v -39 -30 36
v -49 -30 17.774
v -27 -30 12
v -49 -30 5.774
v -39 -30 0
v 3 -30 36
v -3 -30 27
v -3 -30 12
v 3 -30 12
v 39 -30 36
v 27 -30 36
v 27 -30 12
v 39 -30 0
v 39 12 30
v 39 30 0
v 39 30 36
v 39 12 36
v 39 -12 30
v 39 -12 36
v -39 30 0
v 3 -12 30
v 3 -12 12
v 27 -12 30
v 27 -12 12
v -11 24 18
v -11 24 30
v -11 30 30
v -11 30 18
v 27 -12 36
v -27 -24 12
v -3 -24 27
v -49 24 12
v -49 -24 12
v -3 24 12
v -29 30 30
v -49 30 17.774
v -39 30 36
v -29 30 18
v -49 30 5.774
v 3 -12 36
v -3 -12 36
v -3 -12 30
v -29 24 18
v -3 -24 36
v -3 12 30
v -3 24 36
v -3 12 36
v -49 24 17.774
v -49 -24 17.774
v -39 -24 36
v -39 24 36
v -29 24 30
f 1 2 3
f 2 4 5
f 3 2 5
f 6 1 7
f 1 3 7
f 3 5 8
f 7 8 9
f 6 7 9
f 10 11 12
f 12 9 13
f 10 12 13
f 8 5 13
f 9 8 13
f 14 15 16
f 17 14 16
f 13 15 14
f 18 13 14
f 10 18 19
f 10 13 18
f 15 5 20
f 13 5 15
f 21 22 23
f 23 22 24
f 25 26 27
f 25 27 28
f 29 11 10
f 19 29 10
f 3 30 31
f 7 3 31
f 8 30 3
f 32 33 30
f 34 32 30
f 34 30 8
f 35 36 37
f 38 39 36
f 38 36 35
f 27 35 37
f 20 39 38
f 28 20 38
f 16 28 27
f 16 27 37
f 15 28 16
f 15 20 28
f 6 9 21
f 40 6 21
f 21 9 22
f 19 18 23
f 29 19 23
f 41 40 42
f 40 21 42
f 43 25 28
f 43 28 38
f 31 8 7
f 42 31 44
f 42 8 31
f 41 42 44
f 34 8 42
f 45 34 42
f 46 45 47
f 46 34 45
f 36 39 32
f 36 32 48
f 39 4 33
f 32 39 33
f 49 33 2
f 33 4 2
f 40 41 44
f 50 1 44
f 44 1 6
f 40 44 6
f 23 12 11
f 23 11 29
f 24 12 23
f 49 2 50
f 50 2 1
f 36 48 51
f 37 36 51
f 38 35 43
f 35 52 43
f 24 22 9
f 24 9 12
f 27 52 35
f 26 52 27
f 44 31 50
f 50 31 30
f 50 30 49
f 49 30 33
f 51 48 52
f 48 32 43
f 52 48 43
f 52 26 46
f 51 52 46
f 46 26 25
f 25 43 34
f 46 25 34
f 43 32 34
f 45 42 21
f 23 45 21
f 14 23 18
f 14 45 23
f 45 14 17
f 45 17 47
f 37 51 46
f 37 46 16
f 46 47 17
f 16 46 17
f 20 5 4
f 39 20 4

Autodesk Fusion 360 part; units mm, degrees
sketch "Sketch1" plane through (0, 0, 0) normal (0, 1, 0) x (1, 0, 0)
  line L0 (0, 0) -> (39, 0)
  line L1 (0, 0) -> (-39, 0)
  line L2 (39, 0) -> (39, -36)
  line L3 (-39, -36) -> (39, -36)
  line L4 (-39, 0) -> (-49, -5.7735)
  line L5 (-39, 0) -> (1.8239, 0) construction
  line L6 (-49, -5.7735) -> (-49, -17.7735)
  line L7 (-49, -17.7735) -> (-39, -36)
  dimension "d1" = 39
  dimension "d2" = 39
  dimension "d4" = 36
  dimension "d5" = 36
  dimension "d8" = 12
extrude "Extrude1" add sketch "Sketch1" along normal mid plane 60
sketch "Sketch2" plane through (0, 0, 0) normal (0, 0, 1) x (1, 0, 0)
  line L0 (39, -30) -> (39, -12)
  line L1 (39, -12) -> (39, 12)
  line L2 (33, -30) -> (9, -30)
  line L3 (33, -12) -> (9, -12)
  line L4 (9, -12) -> (9, -30)
  line L5 (39, 12) -> (-3, 12)
  line L6 (39, -12) -> (-3, -12)
  line L7 (-3, -12) -> (-3, 12)
  dimension "d11" = 18
  dimension "d12" = 24
  dimension "d13" = 24
  dimension "d14" = 42
  dimension "d15" = 42
extrude "Extrude2" cut sketch "Sketch2" along normal blind 10 from surface at 30
sketch "Sketch3" plane through (0, 0, 0) normal (0, 0, 1) x (1, 0, 0)
  line L0 (27, -30) -> (3, -30)
  line L1 (27, -30) -> (27, -12)
  line L2 (3, -30) -> (3, -12)
  line L3 (3, -12) -> (27, -12)
  dimension "d20" = 24
  dimension "d21" = 18
  dimension "d22" = 18
extrude "Extrude3" cut sketch "Sketch3" along normal blind 30 from surface at 12
sketch "Sketch4" plane through (0, 0, 0) normal (0, 0, 1) x (1, 0, 0)
  line L0 (-3, 12) -> (-3, 24)
  line L1 (-3, 30) -> (-40, 30)
  line L2 (-40, 24) -> (-3, 24)
  line L3 (-40, 24) -> (-49.0656, 24)
  line L4 (-3, -24) -> (-49, -24)
  line L5 (-3, -24) -> (-3, -12)
  line L6 (-3, -12) -> (-3, 12)
  line L7 (-49.0656, 24) -> (-49, -24)
  dimension "d27" = 6
extrude "Extrude4" cut sketch "Sketch4" along normal blind 30 from surface at 12
sketch "Sketch5" plane through (0, 0, 0) normal (0, 1, 0) x (1, 0, 0)
  line L0 (-27, -12) -> (-3, -12)
  line L1 (-3, -12) -> (-3, -27)
  line L2 (-27, -12) -> (-3, -27)
  dimension "d34" = 24
  dimension "d35" = 15
extrude "Extrude5" cut sketch "Sketch5" against normal blind 35
sketch "Sketch6" plane through (0, 0, 0) normal (0, 1, 0) x (1, 0, 0)
  line L0 (-29, -30) -> (-11, -30)
  line L1 (-29, -30) -> (-29, -18)
  line L2 (-11, -30) -> (-11, -18)
  line L3 (-11, -18) -> (-29, -18)
  dimension "d41" = 18
  dimension "d42" = 12
  dimension "d43" = 12
extrude "Extrude6" cut sketch "Sketch6" along normal blind 35
